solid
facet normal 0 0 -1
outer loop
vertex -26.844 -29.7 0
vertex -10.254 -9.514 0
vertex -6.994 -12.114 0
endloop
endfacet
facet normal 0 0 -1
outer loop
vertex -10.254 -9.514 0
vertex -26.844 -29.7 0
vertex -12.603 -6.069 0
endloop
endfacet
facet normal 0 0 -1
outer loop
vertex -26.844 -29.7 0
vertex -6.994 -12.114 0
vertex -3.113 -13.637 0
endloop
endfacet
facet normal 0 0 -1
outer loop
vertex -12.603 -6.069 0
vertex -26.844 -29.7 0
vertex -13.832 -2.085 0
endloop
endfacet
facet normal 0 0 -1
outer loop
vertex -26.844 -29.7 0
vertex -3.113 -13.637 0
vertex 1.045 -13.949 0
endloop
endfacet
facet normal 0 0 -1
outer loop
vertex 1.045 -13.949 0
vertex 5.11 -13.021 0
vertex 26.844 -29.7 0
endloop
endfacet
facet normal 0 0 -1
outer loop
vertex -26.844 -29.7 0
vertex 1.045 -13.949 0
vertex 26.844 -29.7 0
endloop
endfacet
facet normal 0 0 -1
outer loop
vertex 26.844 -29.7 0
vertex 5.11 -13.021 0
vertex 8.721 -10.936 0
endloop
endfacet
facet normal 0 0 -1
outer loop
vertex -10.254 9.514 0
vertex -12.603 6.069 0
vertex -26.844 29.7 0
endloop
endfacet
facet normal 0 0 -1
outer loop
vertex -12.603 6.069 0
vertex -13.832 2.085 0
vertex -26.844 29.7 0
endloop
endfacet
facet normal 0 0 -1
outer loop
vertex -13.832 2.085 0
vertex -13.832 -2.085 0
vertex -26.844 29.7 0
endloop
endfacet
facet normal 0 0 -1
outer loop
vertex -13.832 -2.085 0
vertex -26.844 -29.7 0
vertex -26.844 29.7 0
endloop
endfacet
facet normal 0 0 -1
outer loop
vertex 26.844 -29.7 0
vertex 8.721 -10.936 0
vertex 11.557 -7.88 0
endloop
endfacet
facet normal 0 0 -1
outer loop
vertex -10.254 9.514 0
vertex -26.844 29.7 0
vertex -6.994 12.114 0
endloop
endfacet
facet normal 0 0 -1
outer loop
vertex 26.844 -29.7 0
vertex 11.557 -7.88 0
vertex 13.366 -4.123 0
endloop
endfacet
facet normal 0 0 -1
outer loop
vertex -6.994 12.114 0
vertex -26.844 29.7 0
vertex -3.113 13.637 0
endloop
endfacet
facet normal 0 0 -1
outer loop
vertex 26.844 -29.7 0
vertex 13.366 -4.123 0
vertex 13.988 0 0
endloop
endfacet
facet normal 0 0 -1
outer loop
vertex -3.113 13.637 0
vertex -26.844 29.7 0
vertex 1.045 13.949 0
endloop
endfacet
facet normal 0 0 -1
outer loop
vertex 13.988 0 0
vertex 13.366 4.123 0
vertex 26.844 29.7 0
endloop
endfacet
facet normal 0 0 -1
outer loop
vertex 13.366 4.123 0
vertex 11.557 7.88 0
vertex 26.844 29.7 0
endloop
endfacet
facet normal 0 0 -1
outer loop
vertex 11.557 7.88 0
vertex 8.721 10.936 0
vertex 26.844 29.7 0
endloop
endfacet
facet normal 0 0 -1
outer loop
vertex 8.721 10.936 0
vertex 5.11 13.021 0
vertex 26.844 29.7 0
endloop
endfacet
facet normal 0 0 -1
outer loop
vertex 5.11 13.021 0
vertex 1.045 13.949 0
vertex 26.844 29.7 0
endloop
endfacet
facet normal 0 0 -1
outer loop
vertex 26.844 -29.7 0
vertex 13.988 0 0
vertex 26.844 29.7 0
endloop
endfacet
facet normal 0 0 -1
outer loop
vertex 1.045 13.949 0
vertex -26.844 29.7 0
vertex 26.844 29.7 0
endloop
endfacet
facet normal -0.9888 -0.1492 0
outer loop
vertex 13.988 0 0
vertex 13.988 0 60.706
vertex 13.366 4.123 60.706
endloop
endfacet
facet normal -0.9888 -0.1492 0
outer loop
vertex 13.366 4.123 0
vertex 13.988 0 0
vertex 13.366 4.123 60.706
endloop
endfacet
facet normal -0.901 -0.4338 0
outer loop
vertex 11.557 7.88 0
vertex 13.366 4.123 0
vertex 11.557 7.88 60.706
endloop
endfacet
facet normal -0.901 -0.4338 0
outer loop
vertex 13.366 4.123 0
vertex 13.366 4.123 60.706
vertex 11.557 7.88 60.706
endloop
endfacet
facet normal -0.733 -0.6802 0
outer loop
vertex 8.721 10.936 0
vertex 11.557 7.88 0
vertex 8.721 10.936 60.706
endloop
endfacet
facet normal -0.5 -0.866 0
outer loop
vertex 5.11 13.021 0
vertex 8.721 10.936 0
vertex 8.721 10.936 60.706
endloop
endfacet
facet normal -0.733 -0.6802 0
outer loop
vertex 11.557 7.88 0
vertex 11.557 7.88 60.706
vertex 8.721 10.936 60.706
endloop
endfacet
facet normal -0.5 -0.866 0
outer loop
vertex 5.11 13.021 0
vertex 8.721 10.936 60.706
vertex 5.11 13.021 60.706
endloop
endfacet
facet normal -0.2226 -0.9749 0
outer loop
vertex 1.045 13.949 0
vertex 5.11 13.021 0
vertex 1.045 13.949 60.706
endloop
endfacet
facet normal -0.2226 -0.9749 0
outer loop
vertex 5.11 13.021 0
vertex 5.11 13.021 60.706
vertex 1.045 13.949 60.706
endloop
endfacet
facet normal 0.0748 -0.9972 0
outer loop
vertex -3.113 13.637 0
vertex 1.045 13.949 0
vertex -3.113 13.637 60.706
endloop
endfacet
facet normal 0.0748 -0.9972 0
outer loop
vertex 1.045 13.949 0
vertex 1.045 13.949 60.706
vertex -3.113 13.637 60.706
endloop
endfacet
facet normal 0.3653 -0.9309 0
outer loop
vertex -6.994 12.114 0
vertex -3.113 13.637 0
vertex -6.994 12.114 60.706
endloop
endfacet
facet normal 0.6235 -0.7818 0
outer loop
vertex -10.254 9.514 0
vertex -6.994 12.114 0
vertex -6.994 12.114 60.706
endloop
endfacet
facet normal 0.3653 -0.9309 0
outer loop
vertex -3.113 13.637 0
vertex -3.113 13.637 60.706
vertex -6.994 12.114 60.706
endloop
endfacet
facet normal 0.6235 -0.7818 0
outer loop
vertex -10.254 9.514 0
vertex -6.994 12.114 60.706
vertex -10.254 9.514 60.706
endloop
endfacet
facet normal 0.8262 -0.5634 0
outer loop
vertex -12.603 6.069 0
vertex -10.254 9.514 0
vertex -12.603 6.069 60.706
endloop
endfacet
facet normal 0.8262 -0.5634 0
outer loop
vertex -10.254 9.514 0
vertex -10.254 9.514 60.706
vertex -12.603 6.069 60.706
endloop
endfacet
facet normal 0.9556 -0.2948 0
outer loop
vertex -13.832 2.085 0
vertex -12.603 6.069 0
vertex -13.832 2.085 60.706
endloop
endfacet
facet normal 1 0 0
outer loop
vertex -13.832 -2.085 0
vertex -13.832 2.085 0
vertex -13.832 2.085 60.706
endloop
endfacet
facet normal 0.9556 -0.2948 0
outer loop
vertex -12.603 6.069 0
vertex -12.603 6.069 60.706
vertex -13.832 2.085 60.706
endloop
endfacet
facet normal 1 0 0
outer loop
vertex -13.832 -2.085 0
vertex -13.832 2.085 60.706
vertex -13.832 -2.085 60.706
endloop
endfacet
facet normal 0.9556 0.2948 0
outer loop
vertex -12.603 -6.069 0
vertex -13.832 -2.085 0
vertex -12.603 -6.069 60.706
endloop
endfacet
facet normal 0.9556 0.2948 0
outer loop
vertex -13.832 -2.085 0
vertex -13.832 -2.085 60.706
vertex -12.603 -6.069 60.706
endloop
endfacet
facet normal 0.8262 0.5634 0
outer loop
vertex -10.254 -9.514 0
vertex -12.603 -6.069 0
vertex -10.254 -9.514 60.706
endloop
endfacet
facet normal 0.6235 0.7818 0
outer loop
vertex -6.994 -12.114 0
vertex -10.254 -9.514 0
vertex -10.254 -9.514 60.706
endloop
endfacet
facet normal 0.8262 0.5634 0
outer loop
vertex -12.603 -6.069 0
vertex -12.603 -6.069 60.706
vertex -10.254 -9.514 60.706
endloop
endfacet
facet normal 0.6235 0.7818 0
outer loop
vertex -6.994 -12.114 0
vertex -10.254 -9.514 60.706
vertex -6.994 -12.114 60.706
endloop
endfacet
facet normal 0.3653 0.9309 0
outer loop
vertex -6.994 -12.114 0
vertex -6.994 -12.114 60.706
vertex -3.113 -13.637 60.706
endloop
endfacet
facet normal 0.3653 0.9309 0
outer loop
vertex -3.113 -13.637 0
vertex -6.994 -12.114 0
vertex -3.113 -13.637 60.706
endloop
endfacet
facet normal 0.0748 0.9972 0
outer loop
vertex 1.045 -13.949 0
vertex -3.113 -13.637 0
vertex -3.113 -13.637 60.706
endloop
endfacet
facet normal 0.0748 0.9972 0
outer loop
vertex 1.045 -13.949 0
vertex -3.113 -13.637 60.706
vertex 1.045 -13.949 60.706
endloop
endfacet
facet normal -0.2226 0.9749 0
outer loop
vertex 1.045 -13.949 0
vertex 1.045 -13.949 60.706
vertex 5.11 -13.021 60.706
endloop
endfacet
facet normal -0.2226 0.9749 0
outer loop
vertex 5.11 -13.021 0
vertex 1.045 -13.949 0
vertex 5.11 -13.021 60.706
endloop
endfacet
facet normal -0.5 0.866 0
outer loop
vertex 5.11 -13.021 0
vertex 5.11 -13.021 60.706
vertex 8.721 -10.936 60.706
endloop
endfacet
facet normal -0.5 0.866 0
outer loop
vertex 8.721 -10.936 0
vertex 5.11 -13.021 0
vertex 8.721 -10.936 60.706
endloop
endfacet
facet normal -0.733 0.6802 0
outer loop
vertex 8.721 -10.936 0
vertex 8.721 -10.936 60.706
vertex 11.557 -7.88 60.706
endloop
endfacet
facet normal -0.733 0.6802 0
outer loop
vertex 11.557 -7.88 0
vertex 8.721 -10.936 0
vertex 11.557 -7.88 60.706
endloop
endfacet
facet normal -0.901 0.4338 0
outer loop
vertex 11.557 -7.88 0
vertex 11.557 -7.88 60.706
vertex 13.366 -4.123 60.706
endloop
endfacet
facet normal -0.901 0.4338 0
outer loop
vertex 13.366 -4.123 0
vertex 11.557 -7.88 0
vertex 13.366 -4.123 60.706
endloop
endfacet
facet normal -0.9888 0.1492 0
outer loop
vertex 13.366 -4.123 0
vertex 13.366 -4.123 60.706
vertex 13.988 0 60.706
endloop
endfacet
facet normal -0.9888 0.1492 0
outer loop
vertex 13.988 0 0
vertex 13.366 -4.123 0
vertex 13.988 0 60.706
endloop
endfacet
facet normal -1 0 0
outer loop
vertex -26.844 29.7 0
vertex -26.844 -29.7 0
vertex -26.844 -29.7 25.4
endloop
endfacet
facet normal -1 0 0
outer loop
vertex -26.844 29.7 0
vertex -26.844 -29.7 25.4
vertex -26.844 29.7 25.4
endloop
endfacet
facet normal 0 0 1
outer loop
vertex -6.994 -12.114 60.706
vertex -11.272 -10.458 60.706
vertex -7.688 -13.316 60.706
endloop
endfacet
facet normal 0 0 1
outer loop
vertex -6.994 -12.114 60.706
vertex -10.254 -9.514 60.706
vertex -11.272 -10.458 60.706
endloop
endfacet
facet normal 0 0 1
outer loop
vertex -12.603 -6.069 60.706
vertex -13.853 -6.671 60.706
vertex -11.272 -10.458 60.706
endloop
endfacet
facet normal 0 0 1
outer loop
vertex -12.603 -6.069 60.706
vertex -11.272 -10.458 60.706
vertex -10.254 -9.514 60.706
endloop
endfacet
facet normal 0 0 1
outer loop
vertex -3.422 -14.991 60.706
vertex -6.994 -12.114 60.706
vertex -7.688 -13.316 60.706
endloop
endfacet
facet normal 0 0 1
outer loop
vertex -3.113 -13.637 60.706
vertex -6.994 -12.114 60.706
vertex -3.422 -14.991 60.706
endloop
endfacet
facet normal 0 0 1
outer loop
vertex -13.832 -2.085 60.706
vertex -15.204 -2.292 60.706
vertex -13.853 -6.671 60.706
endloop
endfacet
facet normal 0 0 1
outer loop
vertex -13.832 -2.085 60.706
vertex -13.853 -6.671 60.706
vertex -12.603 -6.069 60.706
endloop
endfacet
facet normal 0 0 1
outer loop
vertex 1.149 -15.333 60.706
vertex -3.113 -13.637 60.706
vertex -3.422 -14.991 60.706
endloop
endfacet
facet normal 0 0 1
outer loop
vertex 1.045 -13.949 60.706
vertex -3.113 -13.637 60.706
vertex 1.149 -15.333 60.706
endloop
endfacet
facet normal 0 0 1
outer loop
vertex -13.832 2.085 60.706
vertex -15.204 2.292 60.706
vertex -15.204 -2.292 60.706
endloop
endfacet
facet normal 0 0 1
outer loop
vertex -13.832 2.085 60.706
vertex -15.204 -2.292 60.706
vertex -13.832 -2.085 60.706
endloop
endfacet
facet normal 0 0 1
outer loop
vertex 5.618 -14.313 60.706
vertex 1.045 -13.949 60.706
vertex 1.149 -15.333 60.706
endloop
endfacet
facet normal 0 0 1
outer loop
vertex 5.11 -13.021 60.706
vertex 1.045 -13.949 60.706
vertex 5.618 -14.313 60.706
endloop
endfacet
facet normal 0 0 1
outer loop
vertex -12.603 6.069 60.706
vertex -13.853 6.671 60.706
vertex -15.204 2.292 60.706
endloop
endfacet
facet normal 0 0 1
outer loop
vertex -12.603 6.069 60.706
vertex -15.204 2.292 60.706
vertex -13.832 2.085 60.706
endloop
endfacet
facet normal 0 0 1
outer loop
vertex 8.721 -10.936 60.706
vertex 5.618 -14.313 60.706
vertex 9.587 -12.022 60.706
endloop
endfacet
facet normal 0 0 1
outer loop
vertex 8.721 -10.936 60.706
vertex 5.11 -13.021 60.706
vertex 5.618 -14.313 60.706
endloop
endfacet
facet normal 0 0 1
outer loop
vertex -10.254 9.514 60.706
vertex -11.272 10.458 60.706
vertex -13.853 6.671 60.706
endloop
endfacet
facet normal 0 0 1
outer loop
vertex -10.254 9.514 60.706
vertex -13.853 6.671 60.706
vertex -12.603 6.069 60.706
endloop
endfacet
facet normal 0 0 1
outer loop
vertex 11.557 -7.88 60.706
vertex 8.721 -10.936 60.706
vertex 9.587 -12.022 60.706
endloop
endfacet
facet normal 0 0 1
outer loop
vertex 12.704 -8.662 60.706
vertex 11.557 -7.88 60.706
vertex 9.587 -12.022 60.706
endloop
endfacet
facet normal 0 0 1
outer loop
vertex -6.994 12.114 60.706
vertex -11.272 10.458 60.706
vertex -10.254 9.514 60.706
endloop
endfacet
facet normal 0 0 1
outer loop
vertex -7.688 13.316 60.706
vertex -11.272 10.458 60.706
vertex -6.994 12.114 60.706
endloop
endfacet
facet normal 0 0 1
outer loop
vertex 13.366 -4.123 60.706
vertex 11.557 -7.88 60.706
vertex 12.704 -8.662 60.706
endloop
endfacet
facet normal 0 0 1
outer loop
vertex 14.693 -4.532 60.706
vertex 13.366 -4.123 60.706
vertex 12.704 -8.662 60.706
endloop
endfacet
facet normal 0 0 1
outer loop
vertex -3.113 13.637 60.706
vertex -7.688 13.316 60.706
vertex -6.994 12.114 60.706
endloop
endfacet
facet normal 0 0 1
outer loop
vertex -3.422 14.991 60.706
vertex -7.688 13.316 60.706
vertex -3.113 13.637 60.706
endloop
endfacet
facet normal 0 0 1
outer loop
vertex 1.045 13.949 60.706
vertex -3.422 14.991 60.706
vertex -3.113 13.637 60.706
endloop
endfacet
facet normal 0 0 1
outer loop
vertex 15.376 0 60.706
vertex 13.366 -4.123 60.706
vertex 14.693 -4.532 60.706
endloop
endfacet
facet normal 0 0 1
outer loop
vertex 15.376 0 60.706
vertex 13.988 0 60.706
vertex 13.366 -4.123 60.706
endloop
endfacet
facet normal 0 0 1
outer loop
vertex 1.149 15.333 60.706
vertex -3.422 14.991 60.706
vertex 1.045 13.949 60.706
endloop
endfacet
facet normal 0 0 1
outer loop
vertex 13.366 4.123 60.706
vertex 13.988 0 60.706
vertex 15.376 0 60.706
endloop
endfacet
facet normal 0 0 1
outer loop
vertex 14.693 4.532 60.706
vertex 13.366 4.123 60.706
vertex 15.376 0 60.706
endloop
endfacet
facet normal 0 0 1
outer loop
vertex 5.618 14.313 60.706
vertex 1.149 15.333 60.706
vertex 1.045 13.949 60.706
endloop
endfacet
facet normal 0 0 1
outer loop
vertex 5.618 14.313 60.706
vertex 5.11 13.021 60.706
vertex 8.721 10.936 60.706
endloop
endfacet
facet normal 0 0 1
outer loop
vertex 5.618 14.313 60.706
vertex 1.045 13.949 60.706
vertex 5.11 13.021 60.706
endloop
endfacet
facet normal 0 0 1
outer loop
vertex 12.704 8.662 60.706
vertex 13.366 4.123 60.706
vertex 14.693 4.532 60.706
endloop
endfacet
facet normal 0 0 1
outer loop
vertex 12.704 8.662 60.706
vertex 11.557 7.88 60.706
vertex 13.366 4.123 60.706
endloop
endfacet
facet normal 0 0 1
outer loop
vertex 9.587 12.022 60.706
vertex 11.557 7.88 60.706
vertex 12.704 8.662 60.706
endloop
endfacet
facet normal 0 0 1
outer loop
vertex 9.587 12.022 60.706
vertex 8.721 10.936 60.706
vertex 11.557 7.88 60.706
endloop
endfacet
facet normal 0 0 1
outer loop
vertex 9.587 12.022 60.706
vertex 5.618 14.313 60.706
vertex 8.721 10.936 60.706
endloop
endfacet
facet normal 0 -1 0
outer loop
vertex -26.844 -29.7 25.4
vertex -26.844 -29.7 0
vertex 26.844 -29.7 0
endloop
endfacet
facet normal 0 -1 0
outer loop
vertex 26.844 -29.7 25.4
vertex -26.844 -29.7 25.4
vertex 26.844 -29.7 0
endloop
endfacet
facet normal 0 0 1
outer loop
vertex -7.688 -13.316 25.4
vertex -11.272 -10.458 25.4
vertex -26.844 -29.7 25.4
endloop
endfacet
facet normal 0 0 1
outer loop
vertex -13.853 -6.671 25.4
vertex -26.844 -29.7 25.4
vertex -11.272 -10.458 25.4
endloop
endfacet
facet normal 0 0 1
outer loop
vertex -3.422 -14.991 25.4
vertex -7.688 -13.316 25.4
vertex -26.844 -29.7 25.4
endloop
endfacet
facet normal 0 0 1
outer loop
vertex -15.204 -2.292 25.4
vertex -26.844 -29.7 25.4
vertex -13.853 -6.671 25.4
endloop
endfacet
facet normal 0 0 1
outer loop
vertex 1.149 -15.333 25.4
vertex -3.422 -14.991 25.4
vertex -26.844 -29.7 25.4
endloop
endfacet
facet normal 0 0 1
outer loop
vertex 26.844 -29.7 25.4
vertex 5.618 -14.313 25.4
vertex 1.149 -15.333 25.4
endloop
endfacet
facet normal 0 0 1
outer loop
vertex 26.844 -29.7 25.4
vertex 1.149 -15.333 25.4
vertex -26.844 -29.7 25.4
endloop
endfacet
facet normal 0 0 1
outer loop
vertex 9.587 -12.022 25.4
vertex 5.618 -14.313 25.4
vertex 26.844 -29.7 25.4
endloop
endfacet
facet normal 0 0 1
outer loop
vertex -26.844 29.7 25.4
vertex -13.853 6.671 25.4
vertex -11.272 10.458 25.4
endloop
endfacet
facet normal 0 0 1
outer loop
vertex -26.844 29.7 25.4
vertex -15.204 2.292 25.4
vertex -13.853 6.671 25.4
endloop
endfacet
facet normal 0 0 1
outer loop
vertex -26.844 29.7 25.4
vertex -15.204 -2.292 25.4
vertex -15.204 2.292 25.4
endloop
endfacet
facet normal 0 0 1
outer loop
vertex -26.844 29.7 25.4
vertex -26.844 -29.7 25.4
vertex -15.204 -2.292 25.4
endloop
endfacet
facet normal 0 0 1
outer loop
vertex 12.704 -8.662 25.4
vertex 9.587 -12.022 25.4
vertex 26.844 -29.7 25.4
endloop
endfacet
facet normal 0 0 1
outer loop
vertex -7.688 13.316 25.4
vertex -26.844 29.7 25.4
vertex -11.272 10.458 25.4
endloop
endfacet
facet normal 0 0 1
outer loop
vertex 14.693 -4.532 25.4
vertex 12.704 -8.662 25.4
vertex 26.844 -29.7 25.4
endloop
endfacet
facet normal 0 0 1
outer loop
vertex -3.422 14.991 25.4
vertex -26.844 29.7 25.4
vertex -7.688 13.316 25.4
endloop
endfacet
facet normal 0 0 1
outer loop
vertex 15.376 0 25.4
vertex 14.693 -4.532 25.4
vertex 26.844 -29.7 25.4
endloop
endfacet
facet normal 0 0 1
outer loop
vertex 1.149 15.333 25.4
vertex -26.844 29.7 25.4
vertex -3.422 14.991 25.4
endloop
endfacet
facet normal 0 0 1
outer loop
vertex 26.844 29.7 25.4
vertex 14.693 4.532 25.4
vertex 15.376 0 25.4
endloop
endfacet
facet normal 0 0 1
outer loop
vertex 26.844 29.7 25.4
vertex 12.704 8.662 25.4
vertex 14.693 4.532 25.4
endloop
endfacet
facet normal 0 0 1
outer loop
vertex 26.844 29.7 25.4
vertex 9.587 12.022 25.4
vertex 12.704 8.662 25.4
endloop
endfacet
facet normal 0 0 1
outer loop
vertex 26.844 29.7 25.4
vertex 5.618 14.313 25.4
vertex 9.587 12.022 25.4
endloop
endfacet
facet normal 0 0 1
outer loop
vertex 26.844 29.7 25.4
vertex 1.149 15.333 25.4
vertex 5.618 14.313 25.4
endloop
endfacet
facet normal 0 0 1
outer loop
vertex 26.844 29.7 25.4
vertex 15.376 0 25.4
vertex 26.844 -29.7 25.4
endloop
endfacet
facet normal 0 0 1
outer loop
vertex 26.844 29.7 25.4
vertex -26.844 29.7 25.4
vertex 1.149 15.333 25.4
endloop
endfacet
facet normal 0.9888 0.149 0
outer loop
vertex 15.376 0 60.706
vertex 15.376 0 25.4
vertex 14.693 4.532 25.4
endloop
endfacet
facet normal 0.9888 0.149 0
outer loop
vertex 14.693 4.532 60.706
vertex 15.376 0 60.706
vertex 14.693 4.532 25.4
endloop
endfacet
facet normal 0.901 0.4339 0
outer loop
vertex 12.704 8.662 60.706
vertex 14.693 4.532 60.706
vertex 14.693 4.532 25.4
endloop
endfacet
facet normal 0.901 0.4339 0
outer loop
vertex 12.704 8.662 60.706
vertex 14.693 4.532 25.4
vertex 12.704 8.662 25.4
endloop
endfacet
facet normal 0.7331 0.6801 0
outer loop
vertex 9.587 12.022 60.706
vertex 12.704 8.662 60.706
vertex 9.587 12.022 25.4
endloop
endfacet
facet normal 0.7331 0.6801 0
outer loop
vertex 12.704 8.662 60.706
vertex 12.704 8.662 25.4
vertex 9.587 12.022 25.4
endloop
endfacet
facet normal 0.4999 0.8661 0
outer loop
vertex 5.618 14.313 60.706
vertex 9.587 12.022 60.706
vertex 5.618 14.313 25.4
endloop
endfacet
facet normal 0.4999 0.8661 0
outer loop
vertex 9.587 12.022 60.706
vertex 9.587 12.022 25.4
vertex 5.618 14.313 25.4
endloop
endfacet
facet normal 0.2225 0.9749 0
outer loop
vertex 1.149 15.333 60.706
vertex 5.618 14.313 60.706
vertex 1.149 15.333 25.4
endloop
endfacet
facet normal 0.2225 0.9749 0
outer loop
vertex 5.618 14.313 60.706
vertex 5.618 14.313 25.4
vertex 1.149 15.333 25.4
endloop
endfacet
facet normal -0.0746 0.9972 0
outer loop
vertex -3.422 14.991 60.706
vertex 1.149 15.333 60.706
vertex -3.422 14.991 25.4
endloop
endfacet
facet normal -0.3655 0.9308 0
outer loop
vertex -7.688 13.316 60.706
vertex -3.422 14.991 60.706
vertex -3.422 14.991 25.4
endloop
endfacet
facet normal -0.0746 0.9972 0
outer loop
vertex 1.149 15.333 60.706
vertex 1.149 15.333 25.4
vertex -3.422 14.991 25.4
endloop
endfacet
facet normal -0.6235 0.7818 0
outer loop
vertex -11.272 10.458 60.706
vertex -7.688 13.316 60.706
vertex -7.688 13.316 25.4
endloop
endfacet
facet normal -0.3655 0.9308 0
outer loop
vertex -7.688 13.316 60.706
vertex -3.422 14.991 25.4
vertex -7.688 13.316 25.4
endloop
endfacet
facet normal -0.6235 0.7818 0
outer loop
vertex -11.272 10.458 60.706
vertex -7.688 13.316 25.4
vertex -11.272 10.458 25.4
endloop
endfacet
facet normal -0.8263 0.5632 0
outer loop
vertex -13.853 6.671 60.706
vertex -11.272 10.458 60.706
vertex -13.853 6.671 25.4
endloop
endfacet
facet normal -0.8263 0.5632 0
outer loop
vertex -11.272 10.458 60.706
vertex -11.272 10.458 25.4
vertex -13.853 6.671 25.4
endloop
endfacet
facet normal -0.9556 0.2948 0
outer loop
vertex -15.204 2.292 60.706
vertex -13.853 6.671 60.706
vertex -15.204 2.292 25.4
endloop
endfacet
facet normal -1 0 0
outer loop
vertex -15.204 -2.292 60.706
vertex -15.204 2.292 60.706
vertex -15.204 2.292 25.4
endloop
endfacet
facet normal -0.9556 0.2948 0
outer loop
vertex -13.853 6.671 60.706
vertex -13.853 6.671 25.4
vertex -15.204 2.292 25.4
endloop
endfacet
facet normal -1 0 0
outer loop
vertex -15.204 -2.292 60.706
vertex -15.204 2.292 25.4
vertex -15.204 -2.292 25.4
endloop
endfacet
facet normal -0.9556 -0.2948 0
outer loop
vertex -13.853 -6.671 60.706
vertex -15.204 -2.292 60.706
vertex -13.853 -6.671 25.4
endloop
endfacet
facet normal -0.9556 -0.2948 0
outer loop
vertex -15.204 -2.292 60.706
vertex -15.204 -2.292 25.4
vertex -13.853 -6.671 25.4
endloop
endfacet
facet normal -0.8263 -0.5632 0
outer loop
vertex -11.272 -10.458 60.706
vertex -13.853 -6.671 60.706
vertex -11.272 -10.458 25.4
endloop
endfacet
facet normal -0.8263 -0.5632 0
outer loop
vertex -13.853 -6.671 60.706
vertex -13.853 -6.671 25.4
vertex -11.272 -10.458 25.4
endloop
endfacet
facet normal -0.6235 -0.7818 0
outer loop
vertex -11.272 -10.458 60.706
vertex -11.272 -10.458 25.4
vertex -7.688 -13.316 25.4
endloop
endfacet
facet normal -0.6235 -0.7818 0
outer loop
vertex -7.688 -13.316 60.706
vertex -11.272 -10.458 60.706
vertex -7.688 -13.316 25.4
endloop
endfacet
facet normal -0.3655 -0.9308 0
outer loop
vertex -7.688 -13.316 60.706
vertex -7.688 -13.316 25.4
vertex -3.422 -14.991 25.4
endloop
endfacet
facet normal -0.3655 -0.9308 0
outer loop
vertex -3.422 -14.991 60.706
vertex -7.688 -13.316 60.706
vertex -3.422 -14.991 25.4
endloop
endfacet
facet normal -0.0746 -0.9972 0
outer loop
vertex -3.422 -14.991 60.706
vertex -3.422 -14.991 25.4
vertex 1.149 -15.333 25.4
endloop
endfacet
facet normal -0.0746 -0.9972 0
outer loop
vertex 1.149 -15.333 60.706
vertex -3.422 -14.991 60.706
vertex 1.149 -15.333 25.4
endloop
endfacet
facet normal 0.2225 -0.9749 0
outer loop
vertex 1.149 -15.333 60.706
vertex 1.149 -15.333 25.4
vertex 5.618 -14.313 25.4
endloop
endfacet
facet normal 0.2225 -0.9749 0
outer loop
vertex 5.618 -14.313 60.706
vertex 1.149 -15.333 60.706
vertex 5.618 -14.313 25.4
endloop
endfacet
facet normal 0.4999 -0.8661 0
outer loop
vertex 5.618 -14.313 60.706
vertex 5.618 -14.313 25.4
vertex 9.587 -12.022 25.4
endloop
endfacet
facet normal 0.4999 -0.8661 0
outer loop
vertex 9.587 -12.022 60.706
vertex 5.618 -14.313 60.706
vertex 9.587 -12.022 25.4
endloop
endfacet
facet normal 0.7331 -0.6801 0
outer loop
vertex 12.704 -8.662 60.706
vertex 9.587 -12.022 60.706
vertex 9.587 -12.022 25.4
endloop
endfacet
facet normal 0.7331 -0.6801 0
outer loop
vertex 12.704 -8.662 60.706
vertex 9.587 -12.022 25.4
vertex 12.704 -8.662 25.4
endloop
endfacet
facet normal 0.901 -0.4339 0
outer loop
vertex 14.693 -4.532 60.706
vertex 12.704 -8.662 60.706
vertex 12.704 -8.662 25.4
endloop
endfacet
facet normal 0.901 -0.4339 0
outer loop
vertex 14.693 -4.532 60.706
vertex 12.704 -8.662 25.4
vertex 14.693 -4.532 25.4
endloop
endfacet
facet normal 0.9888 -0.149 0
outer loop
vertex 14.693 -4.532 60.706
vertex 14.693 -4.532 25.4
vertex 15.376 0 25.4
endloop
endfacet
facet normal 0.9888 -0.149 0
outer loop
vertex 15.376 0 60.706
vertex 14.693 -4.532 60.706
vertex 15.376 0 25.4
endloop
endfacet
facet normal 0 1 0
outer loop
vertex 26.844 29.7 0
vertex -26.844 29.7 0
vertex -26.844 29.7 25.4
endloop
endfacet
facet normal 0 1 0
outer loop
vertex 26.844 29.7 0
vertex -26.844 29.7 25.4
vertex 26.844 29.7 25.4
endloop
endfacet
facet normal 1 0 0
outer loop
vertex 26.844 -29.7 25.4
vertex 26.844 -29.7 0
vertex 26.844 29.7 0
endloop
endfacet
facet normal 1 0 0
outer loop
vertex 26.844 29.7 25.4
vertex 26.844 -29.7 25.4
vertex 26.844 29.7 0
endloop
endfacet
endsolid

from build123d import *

# Parameters (mm, degrees)
F1_W     = 53.687666
F1_H     = 59.399114
F1_R     = 15.376156
F2_DEPTH = 25.4
F3_DEPTH = 60.706
F4_R     = 13.987853
F5_DEPTH = 95.25


with BuildPart() as f2:
    # F1 (on face) → F2 (new body)
    with BuildSketch(Plane.XY):
        Rectangle(F1_W, F1_H)
        Circle(F1_R, mode=Mode.SUBTRACT)
    extrude(amount=F2_DEPTH)

    # F1 (on face) → F3 (join)
    with BuildSketch(Plane.XY):
        Circle(F1_R)
    extrude(amount=F3_DEPTH)

    # F4 (on face) → F5 (cut)
    with BuildSketch(Plane.XY.offset(60.706)):
        Circle(F4_R)
    extrude(amount=-F5_DEPTH, mode=Mode.SUBTRACT)


solid = f2.part
